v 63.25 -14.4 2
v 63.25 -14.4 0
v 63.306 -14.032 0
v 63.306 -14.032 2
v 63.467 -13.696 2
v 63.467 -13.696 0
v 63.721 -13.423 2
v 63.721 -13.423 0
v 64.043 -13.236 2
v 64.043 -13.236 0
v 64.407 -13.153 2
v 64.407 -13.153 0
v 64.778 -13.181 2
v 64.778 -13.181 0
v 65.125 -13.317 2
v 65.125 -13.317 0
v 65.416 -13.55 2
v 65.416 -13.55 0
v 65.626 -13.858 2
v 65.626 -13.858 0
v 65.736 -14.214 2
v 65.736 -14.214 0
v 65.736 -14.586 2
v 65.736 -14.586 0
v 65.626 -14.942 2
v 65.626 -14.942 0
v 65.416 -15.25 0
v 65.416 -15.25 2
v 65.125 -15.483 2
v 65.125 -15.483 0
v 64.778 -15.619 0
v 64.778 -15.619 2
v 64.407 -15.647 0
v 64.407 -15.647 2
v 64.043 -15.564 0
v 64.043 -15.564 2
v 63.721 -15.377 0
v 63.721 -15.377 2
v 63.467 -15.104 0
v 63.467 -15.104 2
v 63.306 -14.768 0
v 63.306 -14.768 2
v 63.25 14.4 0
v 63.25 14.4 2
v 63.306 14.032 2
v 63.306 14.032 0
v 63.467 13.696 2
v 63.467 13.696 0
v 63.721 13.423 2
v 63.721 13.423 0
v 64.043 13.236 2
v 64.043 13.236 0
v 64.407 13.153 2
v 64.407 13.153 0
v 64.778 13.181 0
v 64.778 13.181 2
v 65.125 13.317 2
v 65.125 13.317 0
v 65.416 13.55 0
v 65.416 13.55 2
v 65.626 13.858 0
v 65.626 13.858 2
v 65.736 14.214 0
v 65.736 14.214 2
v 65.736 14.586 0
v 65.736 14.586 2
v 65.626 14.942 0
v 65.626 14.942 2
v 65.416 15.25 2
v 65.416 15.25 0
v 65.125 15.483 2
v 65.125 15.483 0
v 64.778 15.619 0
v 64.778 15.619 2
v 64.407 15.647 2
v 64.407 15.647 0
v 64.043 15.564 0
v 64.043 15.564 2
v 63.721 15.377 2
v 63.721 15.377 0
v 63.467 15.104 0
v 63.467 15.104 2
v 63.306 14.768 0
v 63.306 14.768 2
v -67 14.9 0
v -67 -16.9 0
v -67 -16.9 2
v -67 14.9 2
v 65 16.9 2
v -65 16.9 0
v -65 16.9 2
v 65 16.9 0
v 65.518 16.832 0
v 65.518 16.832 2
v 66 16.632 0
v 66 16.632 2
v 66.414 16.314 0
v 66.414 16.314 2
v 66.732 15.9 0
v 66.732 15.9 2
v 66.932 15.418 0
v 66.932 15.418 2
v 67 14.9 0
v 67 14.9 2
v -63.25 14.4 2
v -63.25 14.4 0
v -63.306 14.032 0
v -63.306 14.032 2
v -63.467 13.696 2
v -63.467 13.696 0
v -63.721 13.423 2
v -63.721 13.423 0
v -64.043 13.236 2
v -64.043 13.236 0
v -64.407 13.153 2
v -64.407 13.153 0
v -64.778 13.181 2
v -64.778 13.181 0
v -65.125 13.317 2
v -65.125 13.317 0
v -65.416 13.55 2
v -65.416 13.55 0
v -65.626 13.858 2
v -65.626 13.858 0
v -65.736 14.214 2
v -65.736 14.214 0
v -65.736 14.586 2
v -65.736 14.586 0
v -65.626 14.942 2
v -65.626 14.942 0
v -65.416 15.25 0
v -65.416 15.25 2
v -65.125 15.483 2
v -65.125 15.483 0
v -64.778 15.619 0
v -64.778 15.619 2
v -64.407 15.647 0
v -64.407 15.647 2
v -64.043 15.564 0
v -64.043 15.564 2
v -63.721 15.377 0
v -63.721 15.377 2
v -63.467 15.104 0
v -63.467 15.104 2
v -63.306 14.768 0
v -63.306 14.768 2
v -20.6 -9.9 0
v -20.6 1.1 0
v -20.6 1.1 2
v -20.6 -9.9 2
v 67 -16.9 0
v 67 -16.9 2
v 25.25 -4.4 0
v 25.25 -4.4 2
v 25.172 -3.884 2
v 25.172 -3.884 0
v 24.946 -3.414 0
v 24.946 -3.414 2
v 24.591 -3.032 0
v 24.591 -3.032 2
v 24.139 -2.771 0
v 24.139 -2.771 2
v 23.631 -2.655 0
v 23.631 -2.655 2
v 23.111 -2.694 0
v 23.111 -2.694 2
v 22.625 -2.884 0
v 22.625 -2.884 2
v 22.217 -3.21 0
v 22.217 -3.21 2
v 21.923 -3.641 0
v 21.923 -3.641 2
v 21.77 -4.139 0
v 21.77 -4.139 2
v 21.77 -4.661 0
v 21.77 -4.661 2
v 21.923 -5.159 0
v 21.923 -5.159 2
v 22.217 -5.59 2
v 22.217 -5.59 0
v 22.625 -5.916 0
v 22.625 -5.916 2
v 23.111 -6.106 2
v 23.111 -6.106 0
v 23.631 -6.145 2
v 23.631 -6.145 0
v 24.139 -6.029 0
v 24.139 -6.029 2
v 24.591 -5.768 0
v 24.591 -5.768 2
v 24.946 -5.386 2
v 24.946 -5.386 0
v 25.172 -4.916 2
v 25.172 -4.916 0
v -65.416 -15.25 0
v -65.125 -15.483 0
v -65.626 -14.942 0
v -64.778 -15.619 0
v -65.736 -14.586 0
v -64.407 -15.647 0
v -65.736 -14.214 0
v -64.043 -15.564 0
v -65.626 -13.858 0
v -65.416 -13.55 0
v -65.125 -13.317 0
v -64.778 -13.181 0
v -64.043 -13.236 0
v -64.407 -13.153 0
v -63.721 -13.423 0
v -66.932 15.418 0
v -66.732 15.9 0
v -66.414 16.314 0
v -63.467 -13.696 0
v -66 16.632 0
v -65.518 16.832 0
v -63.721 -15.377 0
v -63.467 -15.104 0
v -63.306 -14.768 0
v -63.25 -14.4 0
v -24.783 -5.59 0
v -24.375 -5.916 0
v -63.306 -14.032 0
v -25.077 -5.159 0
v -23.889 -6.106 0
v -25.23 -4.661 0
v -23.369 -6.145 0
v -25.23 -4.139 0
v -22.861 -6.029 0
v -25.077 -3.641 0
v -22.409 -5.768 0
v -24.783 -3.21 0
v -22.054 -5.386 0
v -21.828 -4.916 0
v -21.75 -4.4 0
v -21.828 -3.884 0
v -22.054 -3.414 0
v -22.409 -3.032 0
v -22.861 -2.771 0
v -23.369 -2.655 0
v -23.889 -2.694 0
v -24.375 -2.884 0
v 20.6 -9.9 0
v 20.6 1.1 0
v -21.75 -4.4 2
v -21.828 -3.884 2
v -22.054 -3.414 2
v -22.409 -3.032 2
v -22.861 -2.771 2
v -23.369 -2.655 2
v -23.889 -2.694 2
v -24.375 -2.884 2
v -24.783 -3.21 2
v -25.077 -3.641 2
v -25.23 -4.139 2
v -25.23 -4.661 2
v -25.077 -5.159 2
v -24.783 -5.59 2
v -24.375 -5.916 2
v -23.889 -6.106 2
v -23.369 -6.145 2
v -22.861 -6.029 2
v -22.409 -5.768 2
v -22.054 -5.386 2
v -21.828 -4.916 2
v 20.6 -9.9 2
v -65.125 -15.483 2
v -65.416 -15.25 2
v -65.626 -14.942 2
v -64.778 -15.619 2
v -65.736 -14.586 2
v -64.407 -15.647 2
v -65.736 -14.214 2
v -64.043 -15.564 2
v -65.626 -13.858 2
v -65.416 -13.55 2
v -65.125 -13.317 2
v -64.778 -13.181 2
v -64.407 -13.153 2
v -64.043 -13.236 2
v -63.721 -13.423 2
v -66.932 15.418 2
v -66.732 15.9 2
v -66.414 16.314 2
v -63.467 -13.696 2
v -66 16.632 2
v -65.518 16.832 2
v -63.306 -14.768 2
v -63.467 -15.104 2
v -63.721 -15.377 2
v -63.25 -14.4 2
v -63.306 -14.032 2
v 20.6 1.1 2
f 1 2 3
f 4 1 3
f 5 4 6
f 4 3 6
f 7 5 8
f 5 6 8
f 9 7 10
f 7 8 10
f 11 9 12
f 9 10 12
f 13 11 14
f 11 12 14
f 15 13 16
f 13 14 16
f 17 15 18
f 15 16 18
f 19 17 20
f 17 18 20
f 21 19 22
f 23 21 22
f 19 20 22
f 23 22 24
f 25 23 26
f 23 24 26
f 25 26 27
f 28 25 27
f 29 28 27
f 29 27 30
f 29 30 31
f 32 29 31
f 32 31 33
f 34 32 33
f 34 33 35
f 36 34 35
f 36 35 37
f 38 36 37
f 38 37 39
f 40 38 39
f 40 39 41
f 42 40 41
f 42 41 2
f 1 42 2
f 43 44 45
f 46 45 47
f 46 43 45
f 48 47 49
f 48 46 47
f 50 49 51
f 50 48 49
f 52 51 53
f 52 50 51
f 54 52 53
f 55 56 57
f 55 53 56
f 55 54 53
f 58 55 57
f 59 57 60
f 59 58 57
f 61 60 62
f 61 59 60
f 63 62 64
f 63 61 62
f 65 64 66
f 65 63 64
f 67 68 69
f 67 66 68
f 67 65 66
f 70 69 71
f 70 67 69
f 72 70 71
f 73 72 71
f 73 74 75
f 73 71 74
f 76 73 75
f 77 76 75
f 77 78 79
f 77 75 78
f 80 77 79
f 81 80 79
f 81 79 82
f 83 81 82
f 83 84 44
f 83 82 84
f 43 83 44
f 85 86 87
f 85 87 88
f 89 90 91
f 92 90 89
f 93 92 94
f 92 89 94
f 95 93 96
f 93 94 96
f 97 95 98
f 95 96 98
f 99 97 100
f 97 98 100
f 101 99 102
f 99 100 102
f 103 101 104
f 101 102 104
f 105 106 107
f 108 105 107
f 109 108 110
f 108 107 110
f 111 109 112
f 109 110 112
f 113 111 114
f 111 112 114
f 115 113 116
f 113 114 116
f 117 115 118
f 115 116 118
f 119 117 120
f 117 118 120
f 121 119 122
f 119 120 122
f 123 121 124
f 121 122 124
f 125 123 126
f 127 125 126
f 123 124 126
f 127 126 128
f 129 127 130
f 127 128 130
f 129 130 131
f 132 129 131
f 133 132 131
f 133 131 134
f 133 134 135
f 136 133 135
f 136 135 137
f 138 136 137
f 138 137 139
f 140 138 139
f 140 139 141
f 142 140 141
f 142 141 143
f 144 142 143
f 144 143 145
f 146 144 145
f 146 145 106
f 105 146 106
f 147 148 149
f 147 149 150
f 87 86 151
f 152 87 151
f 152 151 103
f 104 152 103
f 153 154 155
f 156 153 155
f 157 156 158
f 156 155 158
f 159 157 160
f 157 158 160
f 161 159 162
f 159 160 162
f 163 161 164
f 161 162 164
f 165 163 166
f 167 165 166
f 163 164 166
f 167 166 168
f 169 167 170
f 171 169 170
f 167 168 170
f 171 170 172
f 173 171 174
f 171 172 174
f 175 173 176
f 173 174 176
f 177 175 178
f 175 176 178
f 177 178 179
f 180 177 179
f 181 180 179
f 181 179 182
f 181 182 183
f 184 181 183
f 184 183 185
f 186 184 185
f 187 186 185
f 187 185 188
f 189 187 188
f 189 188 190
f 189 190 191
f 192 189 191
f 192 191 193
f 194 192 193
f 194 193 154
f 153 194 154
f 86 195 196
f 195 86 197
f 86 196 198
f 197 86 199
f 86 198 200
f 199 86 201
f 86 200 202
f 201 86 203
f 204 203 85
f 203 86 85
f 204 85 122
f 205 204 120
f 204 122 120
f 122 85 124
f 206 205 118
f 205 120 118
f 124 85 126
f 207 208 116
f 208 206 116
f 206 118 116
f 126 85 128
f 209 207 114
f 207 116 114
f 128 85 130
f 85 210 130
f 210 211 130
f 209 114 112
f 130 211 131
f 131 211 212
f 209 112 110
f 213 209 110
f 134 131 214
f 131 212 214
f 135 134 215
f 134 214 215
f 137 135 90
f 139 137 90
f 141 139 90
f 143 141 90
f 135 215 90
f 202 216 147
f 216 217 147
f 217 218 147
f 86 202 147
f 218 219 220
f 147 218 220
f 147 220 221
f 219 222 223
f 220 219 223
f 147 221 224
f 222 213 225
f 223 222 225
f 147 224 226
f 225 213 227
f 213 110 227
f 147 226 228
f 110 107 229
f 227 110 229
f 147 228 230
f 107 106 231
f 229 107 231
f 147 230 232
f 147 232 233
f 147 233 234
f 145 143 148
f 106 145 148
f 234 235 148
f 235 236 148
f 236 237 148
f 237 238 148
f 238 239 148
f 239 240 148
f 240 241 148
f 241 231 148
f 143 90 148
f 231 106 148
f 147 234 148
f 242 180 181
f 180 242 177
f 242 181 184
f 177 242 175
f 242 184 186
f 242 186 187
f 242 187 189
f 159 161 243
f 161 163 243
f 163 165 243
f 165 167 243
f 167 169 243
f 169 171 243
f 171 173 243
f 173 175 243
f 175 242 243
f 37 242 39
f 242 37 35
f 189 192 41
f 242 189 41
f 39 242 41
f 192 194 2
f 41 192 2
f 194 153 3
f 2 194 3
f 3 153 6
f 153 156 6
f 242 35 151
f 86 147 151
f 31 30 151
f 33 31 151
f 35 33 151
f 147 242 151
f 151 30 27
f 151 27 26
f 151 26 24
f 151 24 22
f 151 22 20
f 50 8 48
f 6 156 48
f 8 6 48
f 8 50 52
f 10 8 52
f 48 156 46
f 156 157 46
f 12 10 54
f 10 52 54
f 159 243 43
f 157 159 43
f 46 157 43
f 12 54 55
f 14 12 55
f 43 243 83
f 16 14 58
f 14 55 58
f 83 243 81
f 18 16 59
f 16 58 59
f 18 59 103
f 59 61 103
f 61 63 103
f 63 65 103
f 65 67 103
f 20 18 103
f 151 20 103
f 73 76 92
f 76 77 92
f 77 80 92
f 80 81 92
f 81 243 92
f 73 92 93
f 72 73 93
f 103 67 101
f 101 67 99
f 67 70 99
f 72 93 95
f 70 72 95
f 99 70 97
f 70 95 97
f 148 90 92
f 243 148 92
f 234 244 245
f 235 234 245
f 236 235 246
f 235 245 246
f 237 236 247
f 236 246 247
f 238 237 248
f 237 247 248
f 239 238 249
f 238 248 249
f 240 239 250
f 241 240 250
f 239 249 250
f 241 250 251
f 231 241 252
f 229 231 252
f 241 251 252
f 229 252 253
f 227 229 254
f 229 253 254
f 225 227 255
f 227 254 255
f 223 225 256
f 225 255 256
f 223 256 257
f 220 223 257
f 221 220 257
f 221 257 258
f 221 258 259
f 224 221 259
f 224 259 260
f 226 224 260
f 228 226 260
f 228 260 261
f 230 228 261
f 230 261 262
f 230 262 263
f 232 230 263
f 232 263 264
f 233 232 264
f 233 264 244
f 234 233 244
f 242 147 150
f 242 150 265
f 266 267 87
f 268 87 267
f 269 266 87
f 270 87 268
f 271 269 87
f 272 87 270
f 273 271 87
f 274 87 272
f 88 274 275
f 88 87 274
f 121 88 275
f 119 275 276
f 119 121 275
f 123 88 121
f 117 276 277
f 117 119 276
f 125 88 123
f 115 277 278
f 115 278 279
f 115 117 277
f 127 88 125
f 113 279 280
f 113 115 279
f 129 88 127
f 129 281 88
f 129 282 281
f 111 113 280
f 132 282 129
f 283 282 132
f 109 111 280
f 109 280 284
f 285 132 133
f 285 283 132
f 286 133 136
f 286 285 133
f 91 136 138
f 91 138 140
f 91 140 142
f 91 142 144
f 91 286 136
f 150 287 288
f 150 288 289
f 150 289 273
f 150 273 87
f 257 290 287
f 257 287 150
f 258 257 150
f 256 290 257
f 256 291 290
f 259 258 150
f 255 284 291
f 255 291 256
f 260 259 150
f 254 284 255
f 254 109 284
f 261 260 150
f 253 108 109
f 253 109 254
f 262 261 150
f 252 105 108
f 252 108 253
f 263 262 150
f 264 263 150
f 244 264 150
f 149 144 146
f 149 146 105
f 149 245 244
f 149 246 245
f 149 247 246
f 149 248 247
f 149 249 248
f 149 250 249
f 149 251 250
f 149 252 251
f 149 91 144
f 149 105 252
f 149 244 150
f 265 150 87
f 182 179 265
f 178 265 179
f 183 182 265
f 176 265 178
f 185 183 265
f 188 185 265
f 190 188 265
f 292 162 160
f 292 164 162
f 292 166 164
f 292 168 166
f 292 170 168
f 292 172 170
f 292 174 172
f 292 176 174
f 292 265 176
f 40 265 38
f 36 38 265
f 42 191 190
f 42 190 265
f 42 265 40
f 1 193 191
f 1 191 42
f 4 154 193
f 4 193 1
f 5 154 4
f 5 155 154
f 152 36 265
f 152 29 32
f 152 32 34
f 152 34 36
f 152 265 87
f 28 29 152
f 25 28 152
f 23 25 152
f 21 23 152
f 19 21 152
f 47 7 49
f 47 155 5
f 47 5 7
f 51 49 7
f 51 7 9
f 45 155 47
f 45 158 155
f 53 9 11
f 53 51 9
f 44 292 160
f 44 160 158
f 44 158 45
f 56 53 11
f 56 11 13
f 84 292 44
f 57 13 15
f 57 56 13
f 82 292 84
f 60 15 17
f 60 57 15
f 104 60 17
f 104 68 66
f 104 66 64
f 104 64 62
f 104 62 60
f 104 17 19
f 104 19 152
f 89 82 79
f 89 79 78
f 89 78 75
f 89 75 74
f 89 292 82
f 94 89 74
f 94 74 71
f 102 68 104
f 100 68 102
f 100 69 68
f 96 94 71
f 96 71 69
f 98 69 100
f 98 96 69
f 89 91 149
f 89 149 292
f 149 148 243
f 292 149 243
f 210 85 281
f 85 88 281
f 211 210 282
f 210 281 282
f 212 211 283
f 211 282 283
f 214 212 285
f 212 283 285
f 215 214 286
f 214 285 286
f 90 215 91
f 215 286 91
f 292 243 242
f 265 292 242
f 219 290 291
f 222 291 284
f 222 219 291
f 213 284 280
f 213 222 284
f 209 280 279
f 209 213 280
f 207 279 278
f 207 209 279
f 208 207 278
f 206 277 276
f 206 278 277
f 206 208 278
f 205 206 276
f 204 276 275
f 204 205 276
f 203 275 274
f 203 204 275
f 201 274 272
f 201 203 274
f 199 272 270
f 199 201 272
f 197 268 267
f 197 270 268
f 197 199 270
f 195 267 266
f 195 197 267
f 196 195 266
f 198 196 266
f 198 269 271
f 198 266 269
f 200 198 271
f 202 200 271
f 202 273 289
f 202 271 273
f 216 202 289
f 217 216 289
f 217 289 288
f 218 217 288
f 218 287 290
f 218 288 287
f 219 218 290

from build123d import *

# Parameters (mm, degrees)
SKETCH_W           = 134
SKETCH_H           = 33.8
PAD_DEPTH          = 2
SKETCH001_R        = 1.75
POCKET_DEPTH       = 2.001
FILLET_R           = 2
SKETCH002_R        = 1.25
POCKET001_DEPTH    = 278.424154
POLARPATTERN_COUNT = 2
SKETCH003_W        = 41.2
SKETCH003_H        = 11
POCKET002_DEPTH    = 5


with BuildPart() as part:
    # Sketch → Pad (new body)
    with BuildSketch(Plane.XY):
        Rectangle(SKETCH_W, SKETCH_H)
    extrude(amount=PAD_DEPTH)

    # Sketch001 (on Face6 of Pad) → Pocket (cut, through all)
    with BuildSketch(Plane.XY.offset(2)):
        with Locations((-23.5, -4.4)):
            Circle(SKETCH001_R)
        with Locations((23.5, -4.4)):
            Circle(SKETCH001_R)
    extrude(amount=-POCKET_DEPTH, mode=Mode.SUBTRACT)

    # Fillet
    fillet_edges = [part.edges().sort_by_distance(p)[0] for p in [
        (-67, 16.9, 1),
        (67, 16.9, 1),
    ]]
    fillet(fillet_edges, radius=FILLET_R)

    # Sketch002 → Pocket001 (cut, through all)
    with BuildSketch(Plane.XY):
        with Locations((-64.5, -14.4)):
            Circle(SKETCH002_R)
    pocket001 = extrude(amount=POCKET001_DEPTH, mode=Mode.SUBTRACT)

    # Mirrored: Pocket001 across YZ
    add(pocket001.mirror(Plane.YZ), mode=Mode.SUBTRACT)

    # Mirrored001: Pocket001 across XZ
    add(pocket001.mirror(Plane.XZ), mode=Mode.SUBTRACT)

    # PolarPattern: Pocket001 ×2 about axis
    polarpattern_axis = Axis((0, 0, 0), (0, 0, 1))
    for i in range(1, POLARPATTERN_COUNT):
        add(pocket001.rotate(polarpattern_axis, i * 360 / POLARPATTERN_COUNT), mode=Mode.SUBTRACT)

    # Sketch003 (on Face2 of PolarPattern) → Pocket002 (cut)
    with BuildSketch(Plane(origin=(0, 0, 0), x_dir=(1, 0, 0), z_dir=(0, 0, -1))):
        with Locations((0, 4.4)):
            Rectangle(SKETCH003_W, SKETCH003_H)
    extrude(amount=-POCKET002_DEPTH, mode=Mode.SUBTRACT)


solid = part.part
